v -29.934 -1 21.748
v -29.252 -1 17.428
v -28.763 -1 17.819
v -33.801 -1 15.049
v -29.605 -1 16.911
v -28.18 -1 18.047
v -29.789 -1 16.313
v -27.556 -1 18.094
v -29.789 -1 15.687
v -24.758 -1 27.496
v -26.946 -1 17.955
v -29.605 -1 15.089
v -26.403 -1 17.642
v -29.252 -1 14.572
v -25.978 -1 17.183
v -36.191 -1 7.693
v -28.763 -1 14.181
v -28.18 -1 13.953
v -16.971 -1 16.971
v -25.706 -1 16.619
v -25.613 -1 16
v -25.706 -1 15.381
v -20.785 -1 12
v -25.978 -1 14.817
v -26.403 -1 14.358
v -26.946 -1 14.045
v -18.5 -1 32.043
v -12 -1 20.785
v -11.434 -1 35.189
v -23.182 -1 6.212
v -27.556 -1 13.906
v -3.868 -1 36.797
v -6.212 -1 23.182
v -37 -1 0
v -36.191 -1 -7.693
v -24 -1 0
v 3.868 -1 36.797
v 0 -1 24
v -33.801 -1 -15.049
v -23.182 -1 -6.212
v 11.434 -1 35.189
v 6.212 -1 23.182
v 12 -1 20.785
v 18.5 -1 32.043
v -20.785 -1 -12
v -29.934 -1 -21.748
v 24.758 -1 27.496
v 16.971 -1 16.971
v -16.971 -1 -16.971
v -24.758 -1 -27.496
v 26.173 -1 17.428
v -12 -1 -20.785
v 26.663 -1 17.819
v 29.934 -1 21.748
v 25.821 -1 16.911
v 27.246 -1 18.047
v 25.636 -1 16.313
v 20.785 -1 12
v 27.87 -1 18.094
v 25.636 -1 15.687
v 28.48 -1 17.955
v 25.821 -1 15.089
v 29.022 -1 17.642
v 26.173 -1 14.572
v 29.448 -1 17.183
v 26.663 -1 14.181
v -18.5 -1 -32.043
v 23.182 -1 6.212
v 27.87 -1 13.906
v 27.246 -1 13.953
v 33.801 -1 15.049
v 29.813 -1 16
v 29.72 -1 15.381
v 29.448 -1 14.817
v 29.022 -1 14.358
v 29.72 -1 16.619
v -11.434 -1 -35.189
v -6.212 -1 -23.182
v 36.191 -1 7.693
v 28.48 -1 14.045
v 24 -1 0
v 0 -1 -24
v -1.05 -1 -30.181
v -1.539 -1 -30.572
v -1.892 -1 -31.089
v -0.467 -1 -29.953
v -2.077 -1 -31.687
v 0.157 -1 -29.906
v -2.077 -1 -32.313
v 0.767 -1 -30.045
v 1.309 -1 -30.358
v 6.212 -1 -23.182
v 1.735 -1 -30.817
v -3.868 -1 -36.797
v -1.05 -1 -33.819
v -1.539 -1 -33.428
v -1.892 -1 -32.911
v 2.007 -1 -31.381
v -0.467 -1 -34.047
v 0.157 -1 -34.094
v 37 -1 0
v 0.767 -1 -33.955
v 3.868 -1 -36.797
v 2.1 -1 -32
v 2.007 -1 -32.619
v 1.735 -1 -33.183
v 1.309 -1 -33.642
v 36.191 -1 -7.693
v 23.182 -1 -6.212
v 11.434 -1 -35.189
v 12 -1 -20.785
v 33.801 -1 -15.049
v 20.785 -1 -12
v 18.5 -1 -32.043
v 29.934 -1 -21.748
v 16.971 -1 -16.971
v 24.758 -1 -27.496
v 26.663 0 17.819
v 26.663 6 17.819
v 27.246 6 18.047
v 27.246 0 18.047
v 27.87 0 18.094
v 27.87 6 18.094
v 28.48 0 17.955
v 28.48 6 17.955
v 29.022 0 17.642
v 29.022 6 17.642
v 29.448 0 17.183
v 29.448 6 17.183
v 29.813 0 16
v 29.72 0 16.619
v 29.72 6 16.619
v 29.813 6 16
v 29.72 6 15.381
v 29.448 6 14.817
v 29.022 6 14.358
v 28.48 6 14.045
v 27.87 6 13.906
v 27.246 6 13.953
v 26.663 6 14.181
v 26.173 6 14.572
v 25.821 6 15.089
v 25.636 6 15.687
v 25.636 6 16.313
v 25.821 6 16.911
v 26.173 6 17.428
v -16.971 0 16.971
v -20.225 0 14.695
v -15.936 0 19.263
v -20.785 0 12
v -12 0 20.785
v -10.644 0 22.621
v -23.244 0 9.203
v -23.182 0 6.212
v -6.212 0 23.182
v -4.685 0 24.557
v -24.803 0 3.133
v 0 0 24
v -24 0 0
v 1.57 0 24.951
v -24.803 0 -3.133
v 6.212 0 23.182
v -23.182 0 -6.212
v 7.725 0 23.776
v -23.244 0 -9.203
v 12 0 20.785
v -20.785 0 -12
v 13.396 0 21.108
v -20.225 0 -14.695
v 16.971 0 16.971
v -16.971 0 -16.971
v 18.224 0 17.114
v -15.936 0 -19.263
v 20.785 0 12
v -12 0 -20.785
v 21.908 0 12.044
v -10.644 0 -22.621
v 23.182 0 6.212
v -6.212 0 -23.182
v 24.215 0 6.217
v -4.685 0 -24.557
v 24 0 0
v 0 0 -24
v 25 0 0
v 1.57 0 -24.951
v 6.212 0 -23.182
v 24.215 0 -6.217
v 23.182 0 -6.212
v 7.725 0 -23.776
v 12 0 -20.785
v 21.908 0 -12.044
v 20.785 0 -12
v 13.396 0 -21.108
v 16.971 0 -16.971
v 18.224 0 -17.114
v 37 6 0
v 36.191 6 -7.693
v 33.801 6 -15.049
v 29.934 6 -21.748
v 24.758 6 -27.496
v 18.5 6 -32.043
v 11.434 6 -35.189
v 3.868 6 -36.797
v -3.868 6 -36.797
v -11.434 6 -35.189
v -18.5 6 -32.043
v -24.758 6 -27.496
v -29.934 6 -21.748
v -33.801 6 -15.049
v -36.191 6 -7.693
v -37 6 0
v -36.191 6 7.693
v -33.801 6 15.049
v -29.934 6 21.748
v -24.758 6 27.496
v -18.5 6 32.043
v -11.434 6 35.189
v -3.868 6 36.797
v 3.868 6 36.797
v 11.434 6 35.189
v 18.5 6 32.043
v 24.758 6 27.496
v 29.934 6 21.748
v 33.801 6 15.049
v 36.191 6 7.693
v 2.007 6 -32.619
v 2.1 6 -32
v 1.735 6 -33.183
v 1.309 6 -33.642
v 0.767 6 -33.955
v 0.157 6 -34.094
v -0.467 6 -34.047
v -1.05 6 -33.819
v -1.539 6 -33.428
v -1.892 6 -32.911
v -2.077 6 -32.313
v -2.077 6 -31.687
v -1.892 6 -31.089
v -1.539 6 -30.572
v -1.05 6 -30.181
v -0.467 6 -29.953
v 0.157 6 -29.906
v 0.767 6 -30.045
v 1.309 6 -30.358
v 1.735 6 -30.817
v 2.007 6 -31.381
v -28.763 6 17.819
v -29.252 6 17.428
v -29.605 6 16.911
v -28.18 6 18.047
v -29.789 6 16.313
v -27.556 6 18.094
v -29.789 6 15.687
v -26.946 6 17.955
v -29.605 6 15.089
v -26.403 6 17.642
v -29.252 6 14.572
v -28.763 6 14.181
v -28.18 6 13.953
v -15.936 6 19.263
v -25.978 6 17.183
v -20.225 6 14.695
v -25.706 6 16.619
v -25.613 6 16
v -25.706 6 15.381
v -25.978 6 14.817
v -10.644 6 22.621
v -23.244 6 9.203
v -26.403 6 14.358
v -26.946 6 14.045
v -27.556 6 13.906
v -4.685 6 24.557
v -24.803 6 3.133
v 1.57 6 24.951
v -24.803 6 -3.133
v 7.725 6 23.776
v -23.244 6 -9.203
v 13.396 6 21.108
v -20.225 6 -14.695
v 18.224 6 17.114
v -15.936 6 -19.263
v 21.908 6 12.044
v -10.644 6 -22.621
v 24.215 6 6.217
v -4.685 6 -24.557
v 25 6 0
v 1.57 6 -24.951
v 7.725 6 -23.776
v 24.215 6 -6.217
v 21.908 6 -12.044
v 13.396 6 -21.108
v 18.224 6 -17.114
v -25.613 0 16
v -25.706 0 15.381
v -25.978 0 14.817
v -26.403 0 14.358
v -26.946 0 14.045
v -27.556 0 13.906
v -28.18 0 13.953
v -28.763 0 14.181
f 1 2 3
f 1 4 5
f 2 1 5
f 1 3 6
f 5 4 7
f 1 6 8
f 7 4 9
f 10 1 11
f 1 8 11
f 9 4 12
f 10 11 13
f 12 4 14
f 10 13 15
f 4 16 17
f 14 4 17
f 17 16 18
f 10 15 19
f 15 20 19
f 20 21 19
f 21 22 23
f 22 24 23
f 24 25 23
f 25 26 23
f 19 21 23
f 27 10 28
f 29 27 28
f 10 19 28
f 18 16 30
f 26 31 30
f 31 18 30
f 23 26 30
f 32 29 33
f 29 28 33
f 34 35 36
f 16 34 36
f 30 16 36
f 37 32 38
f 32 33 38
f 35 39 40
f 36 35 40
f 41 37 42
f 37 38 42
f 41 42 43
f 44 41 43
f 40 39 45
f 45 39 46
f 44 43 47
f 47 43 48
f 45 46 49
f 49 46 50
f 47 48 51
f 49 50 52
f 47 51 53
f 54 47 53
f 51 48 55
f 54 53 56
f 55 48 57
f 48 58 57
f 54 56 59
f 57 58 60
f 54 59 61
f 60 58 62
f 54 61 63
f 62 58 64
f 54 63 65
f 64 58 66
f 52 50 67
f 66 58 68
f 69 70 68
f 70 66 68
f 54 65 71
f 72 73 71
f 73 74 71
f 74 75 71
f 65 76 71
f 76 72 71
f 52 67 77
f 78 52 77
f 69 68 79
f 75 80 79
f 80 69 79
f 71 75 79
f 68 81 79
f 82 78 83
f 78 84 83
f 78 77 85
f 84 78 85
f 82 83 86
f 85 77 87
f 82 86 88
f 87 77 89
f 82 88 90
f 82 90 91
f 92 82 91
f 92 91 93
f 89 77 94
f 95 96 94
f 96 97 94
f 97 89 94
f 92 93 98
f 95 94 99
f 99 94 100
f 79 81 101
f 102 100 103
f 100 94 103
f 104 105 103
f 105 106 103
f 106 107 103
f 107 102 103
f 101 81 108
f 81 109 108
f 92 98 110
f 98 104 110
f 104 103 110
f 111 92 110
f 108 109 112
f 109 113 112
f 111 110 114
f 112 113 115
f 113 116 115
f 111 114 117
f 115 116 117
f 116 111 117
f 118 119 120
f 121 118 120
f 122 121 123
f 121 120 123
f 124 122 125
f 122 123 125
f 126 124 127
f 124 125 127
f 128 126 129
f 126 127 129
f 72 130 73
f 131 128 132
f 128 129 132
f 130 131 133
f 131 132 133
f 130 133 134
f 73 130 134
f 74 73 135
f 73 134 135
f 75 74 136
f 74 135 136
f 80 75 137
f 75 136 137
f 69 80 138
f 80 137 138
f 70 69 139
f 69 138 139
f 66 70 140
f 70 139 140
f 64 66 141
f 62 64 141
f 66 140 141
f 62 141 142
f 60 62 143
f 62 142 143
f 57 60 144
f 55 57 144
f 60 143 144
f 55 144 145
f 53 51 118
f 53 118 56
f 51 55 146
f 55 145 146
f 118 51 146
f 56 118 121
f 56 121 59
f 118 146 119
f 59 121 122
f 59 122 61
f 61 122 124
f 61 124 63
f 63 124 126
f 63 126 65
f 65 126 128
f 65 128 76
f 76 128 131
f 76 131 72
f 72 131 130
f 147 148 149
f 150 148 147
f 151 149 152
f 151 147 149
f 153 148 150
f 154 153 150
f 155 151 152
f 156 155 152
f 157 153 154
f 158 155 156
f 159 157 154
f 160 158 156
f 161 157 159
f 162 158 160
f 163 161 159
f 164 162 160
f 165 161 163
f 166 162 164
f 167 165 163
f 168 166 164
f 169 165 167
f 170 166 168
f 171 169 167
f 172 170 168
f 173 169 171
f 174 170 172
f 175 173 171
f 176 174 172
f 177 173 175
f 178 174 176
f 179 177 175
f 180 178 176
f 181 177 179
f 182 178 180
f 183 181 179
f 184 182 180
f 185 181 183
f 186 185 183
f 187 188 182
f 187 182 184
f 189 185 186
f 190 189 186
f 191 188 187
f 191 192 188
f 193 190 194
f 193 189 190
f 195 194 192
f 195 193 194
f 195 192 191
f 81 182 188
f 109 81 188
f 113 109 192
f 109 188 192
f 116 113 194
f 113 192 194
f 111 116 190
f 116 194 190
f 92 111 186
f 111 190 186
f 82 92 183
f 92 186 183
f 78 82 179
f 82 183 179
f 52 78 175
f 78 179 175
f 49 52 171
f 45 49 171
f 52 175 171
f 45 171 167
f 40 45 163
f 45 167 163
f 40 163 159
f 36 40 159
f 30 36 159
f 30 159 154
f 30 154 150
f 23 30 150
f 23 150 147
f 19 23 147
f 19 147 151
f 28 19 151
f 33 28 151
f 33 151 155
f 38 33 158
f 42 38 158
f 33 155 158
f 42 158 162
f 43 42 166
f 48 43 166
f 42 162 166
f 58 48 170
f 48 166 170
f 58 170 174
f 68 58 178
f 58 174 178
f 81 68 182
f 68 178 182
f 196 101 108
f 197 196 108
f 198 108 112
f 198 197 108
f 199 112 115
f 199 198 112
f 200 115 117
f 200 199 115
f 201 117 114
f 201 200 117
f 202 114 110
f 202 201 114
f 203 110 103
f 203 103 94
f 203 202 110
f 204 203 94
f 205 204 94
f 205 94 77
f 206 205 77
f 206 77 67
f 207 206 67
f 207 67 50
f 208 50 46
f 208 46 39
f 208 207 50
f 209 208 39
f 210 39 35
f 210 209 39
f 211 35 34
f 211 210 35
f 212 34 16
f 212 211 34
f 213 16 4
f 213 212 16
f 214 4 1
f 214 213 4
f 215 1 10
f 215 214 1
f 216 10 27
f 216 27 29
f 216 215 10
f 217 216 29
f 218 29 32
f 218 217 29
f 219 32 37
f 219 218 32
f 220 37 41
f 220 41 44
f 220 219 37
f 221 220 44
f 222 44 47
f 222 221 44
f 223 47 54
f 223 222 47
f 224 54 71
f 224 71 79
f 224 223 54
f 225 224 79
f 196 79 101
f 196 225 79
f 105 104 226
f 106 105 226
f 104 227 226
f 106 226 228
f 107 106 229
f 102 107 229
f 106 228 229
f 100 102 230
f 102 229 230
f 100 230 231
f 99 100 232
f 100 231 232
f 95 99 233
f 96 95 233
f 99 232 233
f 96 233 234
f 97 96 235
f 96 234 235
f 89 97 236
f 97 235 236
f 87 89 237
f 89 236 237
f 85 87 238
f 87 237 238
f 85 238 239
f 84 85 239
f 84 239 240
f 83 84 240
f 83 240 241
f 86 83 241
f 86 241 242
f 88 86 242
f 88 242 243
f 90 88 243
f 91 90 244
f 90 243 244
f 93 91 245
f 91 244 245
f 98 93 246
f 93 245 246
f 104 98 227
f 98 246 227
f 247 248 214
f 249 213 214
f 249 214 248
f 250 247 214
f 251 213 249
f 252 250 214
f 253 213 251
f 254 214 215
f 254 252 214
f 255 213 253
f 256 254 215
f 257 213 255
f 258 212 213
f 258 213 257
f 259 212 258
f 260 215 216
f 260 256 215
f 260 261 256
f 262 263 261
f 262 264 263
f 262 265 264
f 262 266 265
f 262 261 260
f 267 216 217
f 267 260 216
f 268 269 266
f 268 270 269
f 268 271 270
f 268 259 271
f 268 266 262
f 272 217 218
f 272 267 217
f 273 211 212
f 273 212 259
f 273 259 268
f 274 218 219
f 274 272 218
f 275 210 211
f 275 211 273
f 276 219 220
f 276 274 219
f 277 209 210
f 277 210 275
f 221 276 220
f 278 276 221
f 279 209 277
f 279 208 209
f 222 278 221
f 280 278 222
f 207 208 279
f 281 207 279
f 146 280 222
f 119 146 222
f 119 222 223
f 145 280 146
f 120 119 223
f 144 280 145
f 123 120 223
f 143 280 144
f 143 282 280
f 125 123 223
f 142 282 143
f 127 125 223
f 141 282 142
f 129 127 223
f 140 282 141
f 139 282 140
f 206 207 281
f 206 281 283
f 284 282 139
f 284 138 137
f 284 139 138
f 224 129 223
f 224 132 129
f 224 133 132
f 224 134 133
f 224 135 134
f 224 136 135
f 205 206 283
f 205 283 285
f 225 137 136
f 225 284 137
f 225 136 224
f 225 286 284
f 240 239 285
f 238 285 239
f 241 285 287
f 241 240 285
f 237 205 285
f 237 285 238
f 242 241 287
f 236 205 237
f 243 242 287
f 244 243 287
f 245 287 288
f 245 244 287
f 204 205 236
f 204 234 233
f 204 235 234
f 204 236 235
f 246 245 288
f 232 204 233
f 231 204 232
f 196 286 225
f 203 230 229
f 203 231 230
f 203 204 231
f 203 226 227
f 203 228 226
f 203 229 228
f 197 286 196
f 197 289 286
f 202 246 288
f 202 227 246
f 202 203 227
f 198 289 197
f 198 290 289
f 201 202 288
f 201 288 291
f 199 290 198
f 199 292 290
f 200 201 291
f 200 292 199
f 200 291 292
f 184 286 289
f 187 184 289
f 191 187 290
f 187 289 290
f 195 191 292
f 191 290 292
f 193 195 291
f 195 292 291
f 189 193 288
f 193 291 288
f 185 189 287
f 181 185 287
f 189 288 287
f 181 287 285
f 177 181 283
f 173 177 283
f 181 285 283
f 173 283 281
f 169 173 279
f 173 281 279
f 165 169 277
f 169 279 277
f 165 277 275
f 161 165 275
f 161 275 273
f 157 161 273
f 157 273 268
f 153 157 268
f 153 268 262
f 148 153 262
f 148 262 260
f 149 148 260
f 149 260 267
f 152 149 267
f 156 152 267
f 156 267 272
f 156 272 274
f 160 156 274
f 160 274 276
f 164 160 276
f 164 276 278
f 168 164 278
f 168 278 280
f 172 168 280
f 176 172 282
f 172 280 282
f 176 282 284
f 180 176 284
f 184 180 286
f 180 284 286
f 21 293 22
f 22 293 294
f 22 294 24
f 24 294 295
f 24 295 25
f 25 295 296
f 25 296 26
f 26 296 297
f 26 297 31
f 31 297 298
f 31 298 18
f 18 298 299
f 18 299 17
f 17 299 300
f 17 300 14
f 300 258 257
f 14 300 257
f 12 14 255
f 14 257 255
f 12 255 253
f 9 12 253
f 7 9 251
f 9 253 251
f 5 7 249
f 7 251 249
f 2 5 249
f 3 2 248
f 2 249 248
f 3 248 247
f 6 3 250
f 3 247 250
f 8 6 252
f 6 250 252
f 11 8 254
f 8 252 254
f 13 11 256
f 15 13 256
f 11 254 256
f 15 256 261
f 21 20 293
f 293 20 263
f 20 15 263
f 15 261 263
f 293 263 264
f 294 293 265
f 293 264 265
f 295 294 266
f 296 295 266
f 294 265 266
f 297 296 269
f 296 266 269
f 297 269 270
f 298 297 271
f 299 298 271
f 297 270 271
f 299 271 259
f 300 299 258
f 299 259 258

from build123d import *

# Parameters (mm, degrees)
SKETCH1_R           = 37
BOSS_EXTRUDE1_DEPTH = 6
SKETCH2_R           = 2.1
CUT_EXTRUDE1_DEPTH  = 7
CIRPATTERN1_COUNT   = 3
SKETCH3_R           = 25
CUT_EXTRUDE2_DEPTH  = 7
SKETCH4_R           = 37
SKETCH4_R_2         = 24
SKETCH4_R_3         = 2.1
BOSS_EXTRUDE2_DEPTH = 1


with BuildPart() as part:
    # Sketch1 → Boss-Extrude1 (new body)
    with BuildSketch(Plane(origin=(0, 0, 0), x_dir=(1, 0, 0), z_dir=(0, 1, 0))):
        Circle(SKETCH1_R)
    extrude(amount=BOSS_EXTRUDE1_DEPTH)

    # Sketch2 → Cut-Extrude1 (cut, through all)
    with BuildSketch(Plane(origin=(0, 6, 0), x_dir=(1, 0, 0), z_dir=(0, 1, 0))):
        with Locations((0, 32)):
            Circle(SKETCH2_R)
    cut_extrude1 = extrude(amount=-CUT_EXTRUDE1_DEPTH, mode=Mode.SUBTRACT)

    # CirPattern1: Cut-Extrude1 ×3 about axis
    cirpattern1_axis = Axis((0, 0, 0), (0, 1, 0))
    for i in range(1, CIRPATTERN1_COUNT):
        add(cut_extrude1.rotate(cirpattern1_axis, i * 360 / CIRPATTERN1_COUNT), mode=Mode.SUBTRACT)

    # Sketch3 → Cut-Extrude2 (cut, through all)
    with BuildSketch(Plane(origin=(0, 6, 0), x_dir=(1, 0, 0), z_dir=(0, 1, 0))):
        Circle(SKETCH3_R)
    extrude(amount=-CUT_EXTRUDE2_DEPTH, mode=Mode.SUBTRACT)

    # Sketch4 → Boss-Extrude2 (add)
    with BuildSketch(Plane(origin=(0, 0, 0), x_dir=(1, 0, 0), z_dir=(0, 1, 0))):
        Circle(SKETCH4_R)
        Circle(SKETCH4_R_2, mode=Mode.SUBTRACT)
        with Locations((-27.712812921, -16)):
            Circle(SKETCH4_R_3, mode=Mode.SUBTRACT)
        with Locations((27.712812921, -16)):
            Circle(SKETCH4_R_3, mode=Mode.SUBTRACT)
        with Locations((0, 32)):
            Circle(SKETCH4_R_3, mode=Mode.SUBTRACT)
    extrude(amount=-BOSS_EXTRUDE2_DEPTH)


solid = part.part
